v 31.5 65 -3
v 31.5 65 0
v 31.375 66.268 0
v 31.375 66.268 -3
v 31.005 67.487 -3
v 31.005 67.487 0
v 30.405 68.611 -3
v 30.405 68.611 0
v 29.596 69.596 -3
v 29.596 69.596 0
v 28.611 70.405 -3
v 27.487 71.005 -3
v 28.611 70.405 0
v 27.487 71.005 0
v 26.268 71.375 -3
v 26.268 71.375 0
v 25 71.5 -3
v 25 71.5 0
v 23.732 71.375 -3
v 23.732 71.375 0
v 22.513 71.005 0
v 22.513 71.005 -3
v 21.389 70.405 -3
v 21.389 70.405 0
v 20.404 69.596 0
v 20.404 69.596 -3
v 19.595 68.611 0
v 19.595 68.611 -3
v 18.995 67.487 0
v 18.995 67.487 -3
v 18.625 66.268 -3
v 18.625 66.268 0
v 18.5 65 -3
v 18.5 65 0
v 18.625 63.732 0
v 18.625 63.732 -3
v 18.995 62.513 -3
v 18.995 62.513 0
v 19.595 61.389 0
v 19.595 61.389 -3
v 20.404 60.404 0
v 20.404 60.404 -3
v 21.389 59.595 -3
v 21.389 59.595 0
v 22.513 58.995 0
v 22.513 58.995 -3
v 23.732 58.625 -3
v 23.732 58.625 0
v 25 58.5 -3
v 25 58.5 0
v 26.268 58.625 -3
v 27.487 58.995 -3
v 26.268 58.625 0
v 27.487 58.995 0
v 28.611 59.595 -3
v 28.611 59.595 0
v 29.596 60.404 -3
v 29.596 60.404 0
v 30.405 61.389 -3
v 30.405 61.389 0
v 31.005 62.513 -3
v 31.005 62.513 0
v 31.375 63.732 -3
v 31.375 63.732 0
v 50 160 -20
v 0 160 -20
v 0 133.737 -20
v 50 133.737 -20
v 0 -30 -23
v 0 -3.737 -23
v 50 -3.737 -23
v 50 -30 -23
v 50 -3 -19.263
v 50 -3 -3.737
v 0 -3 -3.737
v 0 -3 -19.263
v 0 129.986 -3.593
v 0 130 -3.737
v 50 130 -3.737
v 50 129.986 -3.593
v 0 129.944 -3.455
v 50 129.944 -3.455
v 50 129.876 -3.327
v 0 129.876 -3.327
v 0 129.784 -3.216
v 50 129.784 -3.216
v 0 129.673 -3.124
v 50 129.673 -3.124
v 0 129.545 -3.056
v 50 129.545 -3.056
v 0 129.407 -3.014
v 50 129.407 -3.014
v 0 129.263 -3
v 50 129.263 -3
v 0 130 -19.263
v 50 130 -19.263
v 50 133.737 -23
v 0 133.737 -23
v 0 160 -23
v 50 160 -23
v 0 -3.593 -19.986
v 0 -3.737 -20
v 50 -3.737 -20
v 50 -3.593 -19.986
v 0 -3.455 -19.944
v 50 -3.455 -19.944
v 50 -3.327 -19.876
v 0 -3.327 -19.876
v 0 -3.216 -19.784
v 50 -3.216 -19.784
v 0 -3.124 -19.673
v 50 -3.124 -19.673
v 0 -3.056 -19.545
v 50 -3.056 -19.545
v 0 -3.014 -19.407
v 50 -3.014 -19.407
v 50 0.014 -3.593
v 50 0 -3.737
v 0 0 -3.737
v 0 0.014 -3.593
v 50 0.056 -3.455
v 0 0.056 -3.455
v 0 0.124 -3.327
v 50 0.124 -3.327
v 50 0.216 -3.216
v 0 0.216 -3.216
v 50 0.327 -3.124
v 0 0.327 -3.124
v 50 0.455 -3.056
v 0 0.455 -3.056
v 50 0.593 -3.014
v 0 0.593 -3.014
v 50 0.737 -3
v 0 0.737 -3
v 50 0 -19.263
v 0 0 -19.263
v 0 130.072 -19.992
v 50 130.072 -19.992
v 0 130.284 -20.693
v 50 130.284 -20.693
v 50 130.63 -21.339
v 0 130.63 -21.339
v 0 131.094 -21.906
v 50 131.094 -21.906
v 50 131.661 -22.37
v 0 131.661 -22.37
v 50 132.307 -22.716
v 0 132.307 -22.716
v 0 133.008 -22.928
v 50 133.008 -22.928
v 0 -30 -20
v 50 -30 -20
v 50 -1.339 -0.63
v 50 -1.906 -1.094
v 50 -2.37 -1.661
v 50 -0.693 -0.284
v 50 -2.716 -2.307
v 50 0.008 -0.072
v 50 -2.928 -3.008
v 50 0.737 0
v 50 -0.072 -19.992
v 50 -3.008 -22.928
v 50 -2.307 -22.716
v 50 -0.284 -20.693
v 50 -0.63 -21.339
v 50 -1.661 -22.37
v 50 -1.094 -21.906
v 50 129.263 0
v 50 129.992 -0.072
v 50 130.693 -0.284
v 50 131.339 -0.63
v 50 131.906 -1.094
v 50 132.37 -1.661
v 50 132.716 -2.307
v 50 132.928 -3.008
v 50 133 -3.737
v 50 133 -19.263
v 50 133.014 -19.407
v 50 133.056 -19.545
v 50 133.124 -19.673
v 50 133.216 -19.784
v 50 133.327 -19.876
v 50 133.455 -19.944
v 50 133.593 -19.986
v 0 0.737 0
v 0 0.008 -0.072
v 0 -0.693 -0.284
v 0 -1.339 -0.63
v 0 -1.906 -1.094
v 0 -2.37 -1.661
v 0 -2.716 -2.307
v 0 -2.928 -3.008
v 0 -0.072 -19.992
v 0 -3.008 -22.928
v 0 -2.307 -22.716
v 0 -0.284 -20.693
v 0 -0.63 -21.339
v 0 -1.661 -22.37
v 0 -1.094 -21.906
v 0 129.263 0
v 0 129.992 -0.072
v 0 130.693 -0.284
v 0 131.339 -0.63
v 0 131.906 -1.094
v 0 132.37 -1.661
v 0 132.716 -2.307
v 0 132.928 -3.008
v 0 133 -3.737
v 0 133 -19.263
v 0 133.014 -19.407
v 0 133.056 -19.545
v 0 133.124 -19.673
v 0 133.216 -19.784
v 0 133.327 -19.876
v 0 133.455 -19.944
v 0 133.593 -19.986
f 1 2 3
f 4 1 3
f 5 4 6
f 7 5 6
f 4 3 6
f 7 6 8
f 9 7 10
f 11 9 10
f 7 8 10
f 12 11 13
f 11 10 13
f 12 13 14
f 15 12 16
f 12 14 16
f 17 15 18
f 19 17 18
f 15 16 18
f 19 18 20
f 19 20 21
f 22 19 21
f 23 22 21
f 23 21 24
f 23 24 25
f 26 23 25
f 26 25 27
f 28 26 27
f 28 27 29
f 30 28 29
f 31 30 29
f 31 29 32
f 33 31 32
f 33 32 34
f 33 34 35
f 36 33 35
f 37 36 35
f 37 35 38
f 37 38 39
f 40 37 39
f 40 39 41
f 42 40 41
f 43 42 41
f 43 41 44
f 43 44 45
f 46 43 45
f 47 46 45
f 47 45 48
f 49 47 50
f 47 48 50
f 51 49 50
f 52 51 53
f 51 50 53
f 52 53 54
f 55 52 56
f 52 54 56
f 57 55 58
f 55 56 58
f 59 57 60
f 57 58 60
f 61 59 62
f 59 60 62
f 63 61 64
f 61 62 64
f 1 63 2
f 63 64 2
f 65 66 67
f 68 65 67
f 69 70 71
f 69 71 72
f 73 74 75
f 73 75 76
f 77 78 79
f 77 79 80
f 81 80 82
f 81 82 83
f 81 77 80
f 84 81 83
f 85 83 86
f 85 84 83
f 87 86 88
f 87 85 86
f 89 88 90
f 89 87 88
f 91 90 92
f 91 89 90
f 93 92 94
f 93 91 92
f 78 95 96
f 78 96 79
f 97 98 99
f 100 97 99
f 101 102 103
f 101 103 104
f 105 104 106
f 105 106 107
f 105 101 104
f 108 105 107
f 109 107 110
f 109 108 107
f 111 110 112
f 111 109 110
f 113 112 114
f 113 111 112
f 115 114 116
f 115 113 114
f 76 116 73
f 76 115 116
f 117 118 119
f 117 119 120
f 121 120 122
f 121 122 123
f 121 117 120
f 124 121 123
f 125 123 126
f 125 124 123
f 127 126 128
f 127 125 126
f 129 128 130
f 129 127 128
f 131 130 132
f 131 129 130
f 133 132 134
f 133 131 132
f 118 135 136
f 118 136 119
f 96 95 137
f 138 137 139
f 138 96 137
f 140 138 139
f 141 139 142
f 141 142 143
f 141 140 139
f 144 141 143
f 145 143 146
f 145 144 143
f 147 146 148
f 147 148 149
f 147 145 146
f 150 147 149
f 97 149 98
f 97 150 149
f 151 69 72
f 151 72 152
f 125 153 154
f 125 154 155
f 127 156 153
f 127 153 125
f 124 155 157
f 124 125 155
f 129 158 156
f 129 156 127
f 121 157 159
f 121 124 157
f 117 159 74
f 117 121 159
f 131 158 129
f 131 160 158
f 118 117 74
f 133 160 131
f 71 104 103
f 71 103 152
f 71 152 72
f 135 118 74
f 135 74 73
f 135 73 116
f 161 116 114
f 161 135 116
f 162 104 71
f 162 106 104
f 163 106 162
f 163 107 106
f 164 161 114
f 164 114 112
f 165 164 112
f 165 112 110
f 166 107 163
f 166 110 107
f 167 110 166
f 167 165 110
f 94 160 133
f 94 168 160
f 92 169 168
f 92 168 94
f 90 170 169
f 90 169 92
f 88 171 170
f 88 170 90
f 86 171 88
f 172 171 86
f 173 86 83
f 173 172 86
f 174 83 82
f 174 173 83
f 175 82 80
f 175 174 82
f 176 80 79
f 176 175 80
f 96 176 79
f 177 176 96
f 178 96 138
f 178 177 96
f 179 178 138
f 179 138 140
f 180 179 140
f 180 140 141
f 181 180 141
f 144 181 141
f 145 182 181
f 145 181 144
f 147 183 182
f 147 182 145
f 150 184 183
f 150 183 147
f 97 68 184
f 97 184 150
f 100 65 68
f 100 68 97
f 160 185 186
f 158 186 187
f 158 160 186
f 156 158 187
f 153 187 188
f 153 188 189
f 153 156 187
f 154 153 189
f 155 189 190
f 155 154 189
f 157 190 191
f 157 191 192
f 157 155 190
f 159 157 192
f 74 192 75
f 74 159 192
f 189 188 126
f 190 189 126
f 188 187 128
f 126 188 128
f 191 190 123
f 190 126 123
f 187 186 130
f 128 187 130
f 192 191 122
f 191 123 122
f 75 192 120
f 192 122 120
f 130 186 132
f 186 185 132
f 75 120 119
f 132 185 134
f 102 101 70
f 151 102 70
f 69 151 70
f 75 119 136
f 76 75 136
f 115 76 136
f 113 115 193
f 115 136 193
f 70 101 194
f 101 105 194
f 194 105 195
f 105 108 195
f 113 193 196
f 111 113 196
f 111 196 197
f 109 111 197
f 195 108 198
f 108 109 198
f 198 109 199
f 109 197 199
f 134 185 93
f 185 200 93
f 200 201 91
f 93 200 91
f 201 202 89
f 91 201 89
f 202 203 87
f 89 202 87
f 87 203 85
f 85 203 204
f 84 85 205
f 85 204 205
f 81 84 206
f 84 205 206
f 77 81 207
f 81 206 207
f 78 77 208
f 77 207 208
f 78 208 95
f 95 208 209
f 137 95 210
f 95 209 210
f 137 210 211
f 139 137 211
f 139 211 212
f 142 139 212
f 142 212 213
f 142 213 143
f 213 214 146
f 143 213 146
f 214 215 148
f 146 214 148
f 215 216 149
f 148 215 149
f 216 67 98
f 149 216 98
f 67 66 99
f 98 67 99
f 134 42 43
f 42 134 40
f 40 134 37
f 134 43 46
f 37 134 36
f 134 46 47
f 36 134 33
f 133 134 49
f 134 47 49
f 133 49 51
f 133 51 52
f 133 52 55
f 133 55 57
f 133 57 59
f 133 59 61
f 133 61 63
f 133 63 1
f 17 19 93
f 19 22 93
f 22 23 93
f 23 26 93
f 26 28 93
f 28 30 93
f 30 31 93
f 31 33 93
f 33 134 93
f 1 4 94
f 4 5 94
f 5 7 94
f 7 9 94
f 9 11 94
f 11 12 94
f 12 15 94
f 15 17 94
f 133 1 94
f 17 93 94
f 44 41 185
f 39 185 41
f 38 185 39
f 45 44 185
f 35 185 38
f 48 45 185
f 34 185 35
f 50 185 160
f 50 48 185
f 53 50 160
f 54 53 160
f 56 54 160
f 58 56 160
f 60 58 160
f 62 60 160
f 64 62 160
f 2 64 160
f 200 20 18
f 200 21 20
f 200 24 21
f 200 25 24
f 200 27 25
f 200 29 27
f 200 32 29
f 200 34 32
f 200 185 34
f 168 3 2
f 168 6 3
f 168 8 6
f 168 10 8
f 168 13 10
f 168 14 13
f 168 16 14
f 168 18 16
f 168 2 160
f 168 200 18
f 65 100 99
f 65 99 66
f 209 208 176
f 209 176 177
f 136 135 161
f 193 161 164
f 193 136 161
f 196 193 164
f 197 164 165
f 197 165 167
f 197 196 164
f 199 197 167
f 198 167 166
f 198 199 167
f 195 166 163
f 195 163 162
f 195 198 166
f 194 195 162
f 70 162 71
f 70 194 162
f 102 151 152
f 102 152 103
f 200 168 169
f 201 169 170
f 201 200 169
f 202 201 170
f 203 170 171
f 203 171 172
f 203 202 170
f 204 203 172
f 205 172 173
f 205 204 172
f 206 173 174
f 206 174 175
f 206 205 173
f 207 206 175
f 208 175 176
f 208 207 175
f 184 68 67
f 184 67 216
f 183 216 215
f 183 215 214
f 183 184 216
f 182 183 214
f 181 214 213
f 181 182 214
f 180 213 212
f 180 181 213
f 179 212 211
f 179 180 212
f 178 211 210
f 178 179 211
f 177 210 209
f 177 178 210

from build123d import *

# Parameters (mm, degrees)
SKETCH_1_W                         = 50
SKETCH_1_H                         = 130
SM_BASE_FLANGE_1_DEPTH             = 3
SM_EDGE_FLANGE_1_STRIP_W           = 13.4732
SM_EDGE_FLANGE_1_STRIP_H           = 3
SM_EDGE_FLANGE_1_STRIP_CUT_DEPTH   = 50
SM_EDGE_FLANGE_1_STRIP_2_W         = 13.4732
SM_EDGE_FLANGE_1_STRIP_2_H         = 3
SM_EDGE_FLANGE_1_STRIP_CUT_2_DEPTH = 50
SM_EDGE_FLANGE_1_DEPTH             = 50
SM_EDGE_FLANGE_1_BEND_DEPTH        = 50
SM_EDGE_FLANGE_2_STRIP_W           = 13.4732
SM_EDGE_FLANGE_2_STRIP_H           = 3
SM_EDGE_FLANGE_2_STRIP_CUT_DEPTH   = 50
SM_EDGE_FLANGE_2_STRIP_2_W         = 13.4732
SM_EDGE_FLANGE_2_STRIP_2_H         = 3
SM_EDGE_FLANGE_2_STRIP_CUT_2_DEPTH = 50
SM_EDGE_FLANGE_2_DEPTH             = 50
SM_EDGE_FLANGE_2_BEND_DEPTH        = 50
SKETCH_18_R                        = 6.5
CUT_EXTRUDE_1_DEPTH                = 170.201063826


# Sheet-metal steps are written as plain solids
with BuildPart() as part:
    # Sketch 1 → 基体-法兰1 (new body)
    with BuildSketch(Plane.XY):
        with Locations((25, 65)):
            Rectangle(SKETCH_1_W, SKETCH_1_H)
    extrude(amount=-SM_BASE_FLANGE_1_DEPTH)

    # 边线-法兰1 strip (across the edge) → 边线-法兰1 strip cut (cut)
    with BuildSketch(Plane(origin=(0, 130, -3), x_dir=(0, -1, 0), z_dir=(1, 0, 0))):
        with Locations((-6, -1.5)):
            Rectangle(SM_EDGE_FLANGE_1_STRIP_W, SM_EDGE_FLANGE_1_STRIP_H)
    extrude(amount=SM_EDGE_FLANGE_1_STRIP_CUT_DEPTH, mode=Mode.SUBTRACT)

    # 边线-法兰1 strip 2 (across the edge) → 边线-法兰1 strip cut 2 (cut)
    with BuildSketch(Plane(origin=(50, 0, -3), x_dir=(0, 1, 0), z_dir=(-1, 0, 0))):
        with Locations((-6, -1.5)):
            Rectangle(SM_EDGE_FLANGE_1_STRIP_2_W, SM_EDGE_FLANGE_1_STRIP_2_H)
    extrude(amount=SM_EDGE_FLANGE_1_STRIP_CUT_2_DEPTH, mode=Mode.SUBTRACT)

    # 边线-法兰1 section (across the edge) → 边线-法兰1 (add)
    with BuildSketch(Plane(origin=(0, 130, -3), x_dir=(0, -1, 0), z_dir=(1, 0, 0))):
        with BuildLine():
            Line((-3, 0.7366), (-3, 17))
            Line((-3, 17), (0, 17))
            Line((0, 17), (0, 0.7366))
            ThreePointArc((0, 0.7366), (0.215745145, 0.215745145), (0.7366, 0))
            Line((0.7366, 0), (0.7366, -3))
            ThreePointArc((0.7366, -3), (-1.905575199, -1.905575199), (-3, 0.7366))
        make_face()
    extrude(amount=SM_EDGE_FLANGE_1_DEPTH)

    # 边线-法兰1 section 2 (across the edge) → 边线-法兰1 bend (add)
    with BuildSketch(Plane(origin=(50, 0, -3), x_dir=(0, 1, 0), z_dir=(-1, 0, 0))):
        with BuildLine():
            Line((-3, 0.7366), (-3, 17))
            Line((-3, 17), (0, 17))
            Line((0, 17), (0, 0.7366))
            ThreePointArc((0, 0.7366), (0.215745145, 0.215745145), (0.7366, 0))
            Line((0.7366, 0), (0.7366, -3))
            ThreePointArc((0.7366, -3), (-1.905575199, -1.905575199), (-3, 0.7366))
        make_face()
    extrude(amount=SM_EDGE_FLANGE_1_BEND_DEPTH)

    # 边线-法兰2 strip (across the edge) → 边线-法兰2 strip cut (cut)
    with BuildSketch(Plane(origin=(0, -3, -20), x_dir=(0, 0, 1), z_dir=(1, 0, 0))):
        with Locations((-6, -1.5)):
            Rectangle(SM_EDGE_FLANGE_2_STRIP_W, SM_EDGE_FLANGE_2_STRIP_H)
    extrude(amount=SM_EDGE_FLANGE_2_STRIP_CUT_DEPTH, mode=Mode.SUBTRACT)

    # 边线-法兰2 strip 2 (across the edge) → 边线-法兰2 strip cut 2 (cut)
    with BuildSketch(Plane(origin=(50, 133, -20), x_dir=(0, 0, 1), z_dir=(-1, 0, 0))):
        with Locations((-6, -1.5)):
            Rectangle(SM_EDGE_FLANGE_2_STRIP_2_W, SM_EDGE_FLANGE_2_STRIP_2_H)
    extrude(amount=SM_EDGE_FLANGE_2_STRIP_CUT_2_DEPTH, mode=Mode.SUBTRACT)

    # 边线-法兰2 section (across the edge) → 边线-法兰2 (add)
    with BuildSketch(Plane(origin=(0, -3, -20), x_dir=(0, 0, 1), z_dir=(1, 0, 0))):
        with BuildLine():
            Line((-3, 0.7366), (-3, 27))
            Line((-3, 27), (0, 27))
            Line((0, 27), (0, 0.7366))
            ThreePointArc((0, 0.7366), (0.215745145, 0.215745145), (0.7366, 0))
            Line((0.7366, 0), (0.7366, -3))
            ThreePointArc((0.7366, -3), (-1.905575199, -1.905575199), (-3, 0.7366))
        make_face()
    extrude(amount=SM_EDGE_FLANGE_2_DEPTH)

    # 边线-法兰2 section 2 (across the edge) → 边线-法兰2 bend (add)
    with BuildSketch(Plane(origin=(50, 133, -20), x_dir=(0, 0, 1), z_dir=(-1, 0, 0))):
        with BuildLine():
            Line((-3, 0.7366), (-3, 27))
            Line((-3, 27), (0, 27))
            Line((0, 27), (0, 0.7366))
            ThreePointArc((0, 0.7366), (0.215745145, 0.215745145), (0.7366, 0))
            Line((0.7366, 0), (0.7366, -3))
            ThreePointArc((0.7366, -3), (-1.905575199, -1.905575199), (-3, 0.7366))
        make_face()
    extrude(amount=SM_EDGE_FLANGE_2_BEND_DEPTH)

    # 草图18 → 切除-拉伸1 (cut, through all)
    with BuildSketch(Plane.XY):
        with Locations((25, 65)):
            Circle(SKETCH_18_R)
    extrude(amount=-CUT_EXTRUDE_1_DEPTH, mode=Mode.SUBTRACT)


solid = part.part
